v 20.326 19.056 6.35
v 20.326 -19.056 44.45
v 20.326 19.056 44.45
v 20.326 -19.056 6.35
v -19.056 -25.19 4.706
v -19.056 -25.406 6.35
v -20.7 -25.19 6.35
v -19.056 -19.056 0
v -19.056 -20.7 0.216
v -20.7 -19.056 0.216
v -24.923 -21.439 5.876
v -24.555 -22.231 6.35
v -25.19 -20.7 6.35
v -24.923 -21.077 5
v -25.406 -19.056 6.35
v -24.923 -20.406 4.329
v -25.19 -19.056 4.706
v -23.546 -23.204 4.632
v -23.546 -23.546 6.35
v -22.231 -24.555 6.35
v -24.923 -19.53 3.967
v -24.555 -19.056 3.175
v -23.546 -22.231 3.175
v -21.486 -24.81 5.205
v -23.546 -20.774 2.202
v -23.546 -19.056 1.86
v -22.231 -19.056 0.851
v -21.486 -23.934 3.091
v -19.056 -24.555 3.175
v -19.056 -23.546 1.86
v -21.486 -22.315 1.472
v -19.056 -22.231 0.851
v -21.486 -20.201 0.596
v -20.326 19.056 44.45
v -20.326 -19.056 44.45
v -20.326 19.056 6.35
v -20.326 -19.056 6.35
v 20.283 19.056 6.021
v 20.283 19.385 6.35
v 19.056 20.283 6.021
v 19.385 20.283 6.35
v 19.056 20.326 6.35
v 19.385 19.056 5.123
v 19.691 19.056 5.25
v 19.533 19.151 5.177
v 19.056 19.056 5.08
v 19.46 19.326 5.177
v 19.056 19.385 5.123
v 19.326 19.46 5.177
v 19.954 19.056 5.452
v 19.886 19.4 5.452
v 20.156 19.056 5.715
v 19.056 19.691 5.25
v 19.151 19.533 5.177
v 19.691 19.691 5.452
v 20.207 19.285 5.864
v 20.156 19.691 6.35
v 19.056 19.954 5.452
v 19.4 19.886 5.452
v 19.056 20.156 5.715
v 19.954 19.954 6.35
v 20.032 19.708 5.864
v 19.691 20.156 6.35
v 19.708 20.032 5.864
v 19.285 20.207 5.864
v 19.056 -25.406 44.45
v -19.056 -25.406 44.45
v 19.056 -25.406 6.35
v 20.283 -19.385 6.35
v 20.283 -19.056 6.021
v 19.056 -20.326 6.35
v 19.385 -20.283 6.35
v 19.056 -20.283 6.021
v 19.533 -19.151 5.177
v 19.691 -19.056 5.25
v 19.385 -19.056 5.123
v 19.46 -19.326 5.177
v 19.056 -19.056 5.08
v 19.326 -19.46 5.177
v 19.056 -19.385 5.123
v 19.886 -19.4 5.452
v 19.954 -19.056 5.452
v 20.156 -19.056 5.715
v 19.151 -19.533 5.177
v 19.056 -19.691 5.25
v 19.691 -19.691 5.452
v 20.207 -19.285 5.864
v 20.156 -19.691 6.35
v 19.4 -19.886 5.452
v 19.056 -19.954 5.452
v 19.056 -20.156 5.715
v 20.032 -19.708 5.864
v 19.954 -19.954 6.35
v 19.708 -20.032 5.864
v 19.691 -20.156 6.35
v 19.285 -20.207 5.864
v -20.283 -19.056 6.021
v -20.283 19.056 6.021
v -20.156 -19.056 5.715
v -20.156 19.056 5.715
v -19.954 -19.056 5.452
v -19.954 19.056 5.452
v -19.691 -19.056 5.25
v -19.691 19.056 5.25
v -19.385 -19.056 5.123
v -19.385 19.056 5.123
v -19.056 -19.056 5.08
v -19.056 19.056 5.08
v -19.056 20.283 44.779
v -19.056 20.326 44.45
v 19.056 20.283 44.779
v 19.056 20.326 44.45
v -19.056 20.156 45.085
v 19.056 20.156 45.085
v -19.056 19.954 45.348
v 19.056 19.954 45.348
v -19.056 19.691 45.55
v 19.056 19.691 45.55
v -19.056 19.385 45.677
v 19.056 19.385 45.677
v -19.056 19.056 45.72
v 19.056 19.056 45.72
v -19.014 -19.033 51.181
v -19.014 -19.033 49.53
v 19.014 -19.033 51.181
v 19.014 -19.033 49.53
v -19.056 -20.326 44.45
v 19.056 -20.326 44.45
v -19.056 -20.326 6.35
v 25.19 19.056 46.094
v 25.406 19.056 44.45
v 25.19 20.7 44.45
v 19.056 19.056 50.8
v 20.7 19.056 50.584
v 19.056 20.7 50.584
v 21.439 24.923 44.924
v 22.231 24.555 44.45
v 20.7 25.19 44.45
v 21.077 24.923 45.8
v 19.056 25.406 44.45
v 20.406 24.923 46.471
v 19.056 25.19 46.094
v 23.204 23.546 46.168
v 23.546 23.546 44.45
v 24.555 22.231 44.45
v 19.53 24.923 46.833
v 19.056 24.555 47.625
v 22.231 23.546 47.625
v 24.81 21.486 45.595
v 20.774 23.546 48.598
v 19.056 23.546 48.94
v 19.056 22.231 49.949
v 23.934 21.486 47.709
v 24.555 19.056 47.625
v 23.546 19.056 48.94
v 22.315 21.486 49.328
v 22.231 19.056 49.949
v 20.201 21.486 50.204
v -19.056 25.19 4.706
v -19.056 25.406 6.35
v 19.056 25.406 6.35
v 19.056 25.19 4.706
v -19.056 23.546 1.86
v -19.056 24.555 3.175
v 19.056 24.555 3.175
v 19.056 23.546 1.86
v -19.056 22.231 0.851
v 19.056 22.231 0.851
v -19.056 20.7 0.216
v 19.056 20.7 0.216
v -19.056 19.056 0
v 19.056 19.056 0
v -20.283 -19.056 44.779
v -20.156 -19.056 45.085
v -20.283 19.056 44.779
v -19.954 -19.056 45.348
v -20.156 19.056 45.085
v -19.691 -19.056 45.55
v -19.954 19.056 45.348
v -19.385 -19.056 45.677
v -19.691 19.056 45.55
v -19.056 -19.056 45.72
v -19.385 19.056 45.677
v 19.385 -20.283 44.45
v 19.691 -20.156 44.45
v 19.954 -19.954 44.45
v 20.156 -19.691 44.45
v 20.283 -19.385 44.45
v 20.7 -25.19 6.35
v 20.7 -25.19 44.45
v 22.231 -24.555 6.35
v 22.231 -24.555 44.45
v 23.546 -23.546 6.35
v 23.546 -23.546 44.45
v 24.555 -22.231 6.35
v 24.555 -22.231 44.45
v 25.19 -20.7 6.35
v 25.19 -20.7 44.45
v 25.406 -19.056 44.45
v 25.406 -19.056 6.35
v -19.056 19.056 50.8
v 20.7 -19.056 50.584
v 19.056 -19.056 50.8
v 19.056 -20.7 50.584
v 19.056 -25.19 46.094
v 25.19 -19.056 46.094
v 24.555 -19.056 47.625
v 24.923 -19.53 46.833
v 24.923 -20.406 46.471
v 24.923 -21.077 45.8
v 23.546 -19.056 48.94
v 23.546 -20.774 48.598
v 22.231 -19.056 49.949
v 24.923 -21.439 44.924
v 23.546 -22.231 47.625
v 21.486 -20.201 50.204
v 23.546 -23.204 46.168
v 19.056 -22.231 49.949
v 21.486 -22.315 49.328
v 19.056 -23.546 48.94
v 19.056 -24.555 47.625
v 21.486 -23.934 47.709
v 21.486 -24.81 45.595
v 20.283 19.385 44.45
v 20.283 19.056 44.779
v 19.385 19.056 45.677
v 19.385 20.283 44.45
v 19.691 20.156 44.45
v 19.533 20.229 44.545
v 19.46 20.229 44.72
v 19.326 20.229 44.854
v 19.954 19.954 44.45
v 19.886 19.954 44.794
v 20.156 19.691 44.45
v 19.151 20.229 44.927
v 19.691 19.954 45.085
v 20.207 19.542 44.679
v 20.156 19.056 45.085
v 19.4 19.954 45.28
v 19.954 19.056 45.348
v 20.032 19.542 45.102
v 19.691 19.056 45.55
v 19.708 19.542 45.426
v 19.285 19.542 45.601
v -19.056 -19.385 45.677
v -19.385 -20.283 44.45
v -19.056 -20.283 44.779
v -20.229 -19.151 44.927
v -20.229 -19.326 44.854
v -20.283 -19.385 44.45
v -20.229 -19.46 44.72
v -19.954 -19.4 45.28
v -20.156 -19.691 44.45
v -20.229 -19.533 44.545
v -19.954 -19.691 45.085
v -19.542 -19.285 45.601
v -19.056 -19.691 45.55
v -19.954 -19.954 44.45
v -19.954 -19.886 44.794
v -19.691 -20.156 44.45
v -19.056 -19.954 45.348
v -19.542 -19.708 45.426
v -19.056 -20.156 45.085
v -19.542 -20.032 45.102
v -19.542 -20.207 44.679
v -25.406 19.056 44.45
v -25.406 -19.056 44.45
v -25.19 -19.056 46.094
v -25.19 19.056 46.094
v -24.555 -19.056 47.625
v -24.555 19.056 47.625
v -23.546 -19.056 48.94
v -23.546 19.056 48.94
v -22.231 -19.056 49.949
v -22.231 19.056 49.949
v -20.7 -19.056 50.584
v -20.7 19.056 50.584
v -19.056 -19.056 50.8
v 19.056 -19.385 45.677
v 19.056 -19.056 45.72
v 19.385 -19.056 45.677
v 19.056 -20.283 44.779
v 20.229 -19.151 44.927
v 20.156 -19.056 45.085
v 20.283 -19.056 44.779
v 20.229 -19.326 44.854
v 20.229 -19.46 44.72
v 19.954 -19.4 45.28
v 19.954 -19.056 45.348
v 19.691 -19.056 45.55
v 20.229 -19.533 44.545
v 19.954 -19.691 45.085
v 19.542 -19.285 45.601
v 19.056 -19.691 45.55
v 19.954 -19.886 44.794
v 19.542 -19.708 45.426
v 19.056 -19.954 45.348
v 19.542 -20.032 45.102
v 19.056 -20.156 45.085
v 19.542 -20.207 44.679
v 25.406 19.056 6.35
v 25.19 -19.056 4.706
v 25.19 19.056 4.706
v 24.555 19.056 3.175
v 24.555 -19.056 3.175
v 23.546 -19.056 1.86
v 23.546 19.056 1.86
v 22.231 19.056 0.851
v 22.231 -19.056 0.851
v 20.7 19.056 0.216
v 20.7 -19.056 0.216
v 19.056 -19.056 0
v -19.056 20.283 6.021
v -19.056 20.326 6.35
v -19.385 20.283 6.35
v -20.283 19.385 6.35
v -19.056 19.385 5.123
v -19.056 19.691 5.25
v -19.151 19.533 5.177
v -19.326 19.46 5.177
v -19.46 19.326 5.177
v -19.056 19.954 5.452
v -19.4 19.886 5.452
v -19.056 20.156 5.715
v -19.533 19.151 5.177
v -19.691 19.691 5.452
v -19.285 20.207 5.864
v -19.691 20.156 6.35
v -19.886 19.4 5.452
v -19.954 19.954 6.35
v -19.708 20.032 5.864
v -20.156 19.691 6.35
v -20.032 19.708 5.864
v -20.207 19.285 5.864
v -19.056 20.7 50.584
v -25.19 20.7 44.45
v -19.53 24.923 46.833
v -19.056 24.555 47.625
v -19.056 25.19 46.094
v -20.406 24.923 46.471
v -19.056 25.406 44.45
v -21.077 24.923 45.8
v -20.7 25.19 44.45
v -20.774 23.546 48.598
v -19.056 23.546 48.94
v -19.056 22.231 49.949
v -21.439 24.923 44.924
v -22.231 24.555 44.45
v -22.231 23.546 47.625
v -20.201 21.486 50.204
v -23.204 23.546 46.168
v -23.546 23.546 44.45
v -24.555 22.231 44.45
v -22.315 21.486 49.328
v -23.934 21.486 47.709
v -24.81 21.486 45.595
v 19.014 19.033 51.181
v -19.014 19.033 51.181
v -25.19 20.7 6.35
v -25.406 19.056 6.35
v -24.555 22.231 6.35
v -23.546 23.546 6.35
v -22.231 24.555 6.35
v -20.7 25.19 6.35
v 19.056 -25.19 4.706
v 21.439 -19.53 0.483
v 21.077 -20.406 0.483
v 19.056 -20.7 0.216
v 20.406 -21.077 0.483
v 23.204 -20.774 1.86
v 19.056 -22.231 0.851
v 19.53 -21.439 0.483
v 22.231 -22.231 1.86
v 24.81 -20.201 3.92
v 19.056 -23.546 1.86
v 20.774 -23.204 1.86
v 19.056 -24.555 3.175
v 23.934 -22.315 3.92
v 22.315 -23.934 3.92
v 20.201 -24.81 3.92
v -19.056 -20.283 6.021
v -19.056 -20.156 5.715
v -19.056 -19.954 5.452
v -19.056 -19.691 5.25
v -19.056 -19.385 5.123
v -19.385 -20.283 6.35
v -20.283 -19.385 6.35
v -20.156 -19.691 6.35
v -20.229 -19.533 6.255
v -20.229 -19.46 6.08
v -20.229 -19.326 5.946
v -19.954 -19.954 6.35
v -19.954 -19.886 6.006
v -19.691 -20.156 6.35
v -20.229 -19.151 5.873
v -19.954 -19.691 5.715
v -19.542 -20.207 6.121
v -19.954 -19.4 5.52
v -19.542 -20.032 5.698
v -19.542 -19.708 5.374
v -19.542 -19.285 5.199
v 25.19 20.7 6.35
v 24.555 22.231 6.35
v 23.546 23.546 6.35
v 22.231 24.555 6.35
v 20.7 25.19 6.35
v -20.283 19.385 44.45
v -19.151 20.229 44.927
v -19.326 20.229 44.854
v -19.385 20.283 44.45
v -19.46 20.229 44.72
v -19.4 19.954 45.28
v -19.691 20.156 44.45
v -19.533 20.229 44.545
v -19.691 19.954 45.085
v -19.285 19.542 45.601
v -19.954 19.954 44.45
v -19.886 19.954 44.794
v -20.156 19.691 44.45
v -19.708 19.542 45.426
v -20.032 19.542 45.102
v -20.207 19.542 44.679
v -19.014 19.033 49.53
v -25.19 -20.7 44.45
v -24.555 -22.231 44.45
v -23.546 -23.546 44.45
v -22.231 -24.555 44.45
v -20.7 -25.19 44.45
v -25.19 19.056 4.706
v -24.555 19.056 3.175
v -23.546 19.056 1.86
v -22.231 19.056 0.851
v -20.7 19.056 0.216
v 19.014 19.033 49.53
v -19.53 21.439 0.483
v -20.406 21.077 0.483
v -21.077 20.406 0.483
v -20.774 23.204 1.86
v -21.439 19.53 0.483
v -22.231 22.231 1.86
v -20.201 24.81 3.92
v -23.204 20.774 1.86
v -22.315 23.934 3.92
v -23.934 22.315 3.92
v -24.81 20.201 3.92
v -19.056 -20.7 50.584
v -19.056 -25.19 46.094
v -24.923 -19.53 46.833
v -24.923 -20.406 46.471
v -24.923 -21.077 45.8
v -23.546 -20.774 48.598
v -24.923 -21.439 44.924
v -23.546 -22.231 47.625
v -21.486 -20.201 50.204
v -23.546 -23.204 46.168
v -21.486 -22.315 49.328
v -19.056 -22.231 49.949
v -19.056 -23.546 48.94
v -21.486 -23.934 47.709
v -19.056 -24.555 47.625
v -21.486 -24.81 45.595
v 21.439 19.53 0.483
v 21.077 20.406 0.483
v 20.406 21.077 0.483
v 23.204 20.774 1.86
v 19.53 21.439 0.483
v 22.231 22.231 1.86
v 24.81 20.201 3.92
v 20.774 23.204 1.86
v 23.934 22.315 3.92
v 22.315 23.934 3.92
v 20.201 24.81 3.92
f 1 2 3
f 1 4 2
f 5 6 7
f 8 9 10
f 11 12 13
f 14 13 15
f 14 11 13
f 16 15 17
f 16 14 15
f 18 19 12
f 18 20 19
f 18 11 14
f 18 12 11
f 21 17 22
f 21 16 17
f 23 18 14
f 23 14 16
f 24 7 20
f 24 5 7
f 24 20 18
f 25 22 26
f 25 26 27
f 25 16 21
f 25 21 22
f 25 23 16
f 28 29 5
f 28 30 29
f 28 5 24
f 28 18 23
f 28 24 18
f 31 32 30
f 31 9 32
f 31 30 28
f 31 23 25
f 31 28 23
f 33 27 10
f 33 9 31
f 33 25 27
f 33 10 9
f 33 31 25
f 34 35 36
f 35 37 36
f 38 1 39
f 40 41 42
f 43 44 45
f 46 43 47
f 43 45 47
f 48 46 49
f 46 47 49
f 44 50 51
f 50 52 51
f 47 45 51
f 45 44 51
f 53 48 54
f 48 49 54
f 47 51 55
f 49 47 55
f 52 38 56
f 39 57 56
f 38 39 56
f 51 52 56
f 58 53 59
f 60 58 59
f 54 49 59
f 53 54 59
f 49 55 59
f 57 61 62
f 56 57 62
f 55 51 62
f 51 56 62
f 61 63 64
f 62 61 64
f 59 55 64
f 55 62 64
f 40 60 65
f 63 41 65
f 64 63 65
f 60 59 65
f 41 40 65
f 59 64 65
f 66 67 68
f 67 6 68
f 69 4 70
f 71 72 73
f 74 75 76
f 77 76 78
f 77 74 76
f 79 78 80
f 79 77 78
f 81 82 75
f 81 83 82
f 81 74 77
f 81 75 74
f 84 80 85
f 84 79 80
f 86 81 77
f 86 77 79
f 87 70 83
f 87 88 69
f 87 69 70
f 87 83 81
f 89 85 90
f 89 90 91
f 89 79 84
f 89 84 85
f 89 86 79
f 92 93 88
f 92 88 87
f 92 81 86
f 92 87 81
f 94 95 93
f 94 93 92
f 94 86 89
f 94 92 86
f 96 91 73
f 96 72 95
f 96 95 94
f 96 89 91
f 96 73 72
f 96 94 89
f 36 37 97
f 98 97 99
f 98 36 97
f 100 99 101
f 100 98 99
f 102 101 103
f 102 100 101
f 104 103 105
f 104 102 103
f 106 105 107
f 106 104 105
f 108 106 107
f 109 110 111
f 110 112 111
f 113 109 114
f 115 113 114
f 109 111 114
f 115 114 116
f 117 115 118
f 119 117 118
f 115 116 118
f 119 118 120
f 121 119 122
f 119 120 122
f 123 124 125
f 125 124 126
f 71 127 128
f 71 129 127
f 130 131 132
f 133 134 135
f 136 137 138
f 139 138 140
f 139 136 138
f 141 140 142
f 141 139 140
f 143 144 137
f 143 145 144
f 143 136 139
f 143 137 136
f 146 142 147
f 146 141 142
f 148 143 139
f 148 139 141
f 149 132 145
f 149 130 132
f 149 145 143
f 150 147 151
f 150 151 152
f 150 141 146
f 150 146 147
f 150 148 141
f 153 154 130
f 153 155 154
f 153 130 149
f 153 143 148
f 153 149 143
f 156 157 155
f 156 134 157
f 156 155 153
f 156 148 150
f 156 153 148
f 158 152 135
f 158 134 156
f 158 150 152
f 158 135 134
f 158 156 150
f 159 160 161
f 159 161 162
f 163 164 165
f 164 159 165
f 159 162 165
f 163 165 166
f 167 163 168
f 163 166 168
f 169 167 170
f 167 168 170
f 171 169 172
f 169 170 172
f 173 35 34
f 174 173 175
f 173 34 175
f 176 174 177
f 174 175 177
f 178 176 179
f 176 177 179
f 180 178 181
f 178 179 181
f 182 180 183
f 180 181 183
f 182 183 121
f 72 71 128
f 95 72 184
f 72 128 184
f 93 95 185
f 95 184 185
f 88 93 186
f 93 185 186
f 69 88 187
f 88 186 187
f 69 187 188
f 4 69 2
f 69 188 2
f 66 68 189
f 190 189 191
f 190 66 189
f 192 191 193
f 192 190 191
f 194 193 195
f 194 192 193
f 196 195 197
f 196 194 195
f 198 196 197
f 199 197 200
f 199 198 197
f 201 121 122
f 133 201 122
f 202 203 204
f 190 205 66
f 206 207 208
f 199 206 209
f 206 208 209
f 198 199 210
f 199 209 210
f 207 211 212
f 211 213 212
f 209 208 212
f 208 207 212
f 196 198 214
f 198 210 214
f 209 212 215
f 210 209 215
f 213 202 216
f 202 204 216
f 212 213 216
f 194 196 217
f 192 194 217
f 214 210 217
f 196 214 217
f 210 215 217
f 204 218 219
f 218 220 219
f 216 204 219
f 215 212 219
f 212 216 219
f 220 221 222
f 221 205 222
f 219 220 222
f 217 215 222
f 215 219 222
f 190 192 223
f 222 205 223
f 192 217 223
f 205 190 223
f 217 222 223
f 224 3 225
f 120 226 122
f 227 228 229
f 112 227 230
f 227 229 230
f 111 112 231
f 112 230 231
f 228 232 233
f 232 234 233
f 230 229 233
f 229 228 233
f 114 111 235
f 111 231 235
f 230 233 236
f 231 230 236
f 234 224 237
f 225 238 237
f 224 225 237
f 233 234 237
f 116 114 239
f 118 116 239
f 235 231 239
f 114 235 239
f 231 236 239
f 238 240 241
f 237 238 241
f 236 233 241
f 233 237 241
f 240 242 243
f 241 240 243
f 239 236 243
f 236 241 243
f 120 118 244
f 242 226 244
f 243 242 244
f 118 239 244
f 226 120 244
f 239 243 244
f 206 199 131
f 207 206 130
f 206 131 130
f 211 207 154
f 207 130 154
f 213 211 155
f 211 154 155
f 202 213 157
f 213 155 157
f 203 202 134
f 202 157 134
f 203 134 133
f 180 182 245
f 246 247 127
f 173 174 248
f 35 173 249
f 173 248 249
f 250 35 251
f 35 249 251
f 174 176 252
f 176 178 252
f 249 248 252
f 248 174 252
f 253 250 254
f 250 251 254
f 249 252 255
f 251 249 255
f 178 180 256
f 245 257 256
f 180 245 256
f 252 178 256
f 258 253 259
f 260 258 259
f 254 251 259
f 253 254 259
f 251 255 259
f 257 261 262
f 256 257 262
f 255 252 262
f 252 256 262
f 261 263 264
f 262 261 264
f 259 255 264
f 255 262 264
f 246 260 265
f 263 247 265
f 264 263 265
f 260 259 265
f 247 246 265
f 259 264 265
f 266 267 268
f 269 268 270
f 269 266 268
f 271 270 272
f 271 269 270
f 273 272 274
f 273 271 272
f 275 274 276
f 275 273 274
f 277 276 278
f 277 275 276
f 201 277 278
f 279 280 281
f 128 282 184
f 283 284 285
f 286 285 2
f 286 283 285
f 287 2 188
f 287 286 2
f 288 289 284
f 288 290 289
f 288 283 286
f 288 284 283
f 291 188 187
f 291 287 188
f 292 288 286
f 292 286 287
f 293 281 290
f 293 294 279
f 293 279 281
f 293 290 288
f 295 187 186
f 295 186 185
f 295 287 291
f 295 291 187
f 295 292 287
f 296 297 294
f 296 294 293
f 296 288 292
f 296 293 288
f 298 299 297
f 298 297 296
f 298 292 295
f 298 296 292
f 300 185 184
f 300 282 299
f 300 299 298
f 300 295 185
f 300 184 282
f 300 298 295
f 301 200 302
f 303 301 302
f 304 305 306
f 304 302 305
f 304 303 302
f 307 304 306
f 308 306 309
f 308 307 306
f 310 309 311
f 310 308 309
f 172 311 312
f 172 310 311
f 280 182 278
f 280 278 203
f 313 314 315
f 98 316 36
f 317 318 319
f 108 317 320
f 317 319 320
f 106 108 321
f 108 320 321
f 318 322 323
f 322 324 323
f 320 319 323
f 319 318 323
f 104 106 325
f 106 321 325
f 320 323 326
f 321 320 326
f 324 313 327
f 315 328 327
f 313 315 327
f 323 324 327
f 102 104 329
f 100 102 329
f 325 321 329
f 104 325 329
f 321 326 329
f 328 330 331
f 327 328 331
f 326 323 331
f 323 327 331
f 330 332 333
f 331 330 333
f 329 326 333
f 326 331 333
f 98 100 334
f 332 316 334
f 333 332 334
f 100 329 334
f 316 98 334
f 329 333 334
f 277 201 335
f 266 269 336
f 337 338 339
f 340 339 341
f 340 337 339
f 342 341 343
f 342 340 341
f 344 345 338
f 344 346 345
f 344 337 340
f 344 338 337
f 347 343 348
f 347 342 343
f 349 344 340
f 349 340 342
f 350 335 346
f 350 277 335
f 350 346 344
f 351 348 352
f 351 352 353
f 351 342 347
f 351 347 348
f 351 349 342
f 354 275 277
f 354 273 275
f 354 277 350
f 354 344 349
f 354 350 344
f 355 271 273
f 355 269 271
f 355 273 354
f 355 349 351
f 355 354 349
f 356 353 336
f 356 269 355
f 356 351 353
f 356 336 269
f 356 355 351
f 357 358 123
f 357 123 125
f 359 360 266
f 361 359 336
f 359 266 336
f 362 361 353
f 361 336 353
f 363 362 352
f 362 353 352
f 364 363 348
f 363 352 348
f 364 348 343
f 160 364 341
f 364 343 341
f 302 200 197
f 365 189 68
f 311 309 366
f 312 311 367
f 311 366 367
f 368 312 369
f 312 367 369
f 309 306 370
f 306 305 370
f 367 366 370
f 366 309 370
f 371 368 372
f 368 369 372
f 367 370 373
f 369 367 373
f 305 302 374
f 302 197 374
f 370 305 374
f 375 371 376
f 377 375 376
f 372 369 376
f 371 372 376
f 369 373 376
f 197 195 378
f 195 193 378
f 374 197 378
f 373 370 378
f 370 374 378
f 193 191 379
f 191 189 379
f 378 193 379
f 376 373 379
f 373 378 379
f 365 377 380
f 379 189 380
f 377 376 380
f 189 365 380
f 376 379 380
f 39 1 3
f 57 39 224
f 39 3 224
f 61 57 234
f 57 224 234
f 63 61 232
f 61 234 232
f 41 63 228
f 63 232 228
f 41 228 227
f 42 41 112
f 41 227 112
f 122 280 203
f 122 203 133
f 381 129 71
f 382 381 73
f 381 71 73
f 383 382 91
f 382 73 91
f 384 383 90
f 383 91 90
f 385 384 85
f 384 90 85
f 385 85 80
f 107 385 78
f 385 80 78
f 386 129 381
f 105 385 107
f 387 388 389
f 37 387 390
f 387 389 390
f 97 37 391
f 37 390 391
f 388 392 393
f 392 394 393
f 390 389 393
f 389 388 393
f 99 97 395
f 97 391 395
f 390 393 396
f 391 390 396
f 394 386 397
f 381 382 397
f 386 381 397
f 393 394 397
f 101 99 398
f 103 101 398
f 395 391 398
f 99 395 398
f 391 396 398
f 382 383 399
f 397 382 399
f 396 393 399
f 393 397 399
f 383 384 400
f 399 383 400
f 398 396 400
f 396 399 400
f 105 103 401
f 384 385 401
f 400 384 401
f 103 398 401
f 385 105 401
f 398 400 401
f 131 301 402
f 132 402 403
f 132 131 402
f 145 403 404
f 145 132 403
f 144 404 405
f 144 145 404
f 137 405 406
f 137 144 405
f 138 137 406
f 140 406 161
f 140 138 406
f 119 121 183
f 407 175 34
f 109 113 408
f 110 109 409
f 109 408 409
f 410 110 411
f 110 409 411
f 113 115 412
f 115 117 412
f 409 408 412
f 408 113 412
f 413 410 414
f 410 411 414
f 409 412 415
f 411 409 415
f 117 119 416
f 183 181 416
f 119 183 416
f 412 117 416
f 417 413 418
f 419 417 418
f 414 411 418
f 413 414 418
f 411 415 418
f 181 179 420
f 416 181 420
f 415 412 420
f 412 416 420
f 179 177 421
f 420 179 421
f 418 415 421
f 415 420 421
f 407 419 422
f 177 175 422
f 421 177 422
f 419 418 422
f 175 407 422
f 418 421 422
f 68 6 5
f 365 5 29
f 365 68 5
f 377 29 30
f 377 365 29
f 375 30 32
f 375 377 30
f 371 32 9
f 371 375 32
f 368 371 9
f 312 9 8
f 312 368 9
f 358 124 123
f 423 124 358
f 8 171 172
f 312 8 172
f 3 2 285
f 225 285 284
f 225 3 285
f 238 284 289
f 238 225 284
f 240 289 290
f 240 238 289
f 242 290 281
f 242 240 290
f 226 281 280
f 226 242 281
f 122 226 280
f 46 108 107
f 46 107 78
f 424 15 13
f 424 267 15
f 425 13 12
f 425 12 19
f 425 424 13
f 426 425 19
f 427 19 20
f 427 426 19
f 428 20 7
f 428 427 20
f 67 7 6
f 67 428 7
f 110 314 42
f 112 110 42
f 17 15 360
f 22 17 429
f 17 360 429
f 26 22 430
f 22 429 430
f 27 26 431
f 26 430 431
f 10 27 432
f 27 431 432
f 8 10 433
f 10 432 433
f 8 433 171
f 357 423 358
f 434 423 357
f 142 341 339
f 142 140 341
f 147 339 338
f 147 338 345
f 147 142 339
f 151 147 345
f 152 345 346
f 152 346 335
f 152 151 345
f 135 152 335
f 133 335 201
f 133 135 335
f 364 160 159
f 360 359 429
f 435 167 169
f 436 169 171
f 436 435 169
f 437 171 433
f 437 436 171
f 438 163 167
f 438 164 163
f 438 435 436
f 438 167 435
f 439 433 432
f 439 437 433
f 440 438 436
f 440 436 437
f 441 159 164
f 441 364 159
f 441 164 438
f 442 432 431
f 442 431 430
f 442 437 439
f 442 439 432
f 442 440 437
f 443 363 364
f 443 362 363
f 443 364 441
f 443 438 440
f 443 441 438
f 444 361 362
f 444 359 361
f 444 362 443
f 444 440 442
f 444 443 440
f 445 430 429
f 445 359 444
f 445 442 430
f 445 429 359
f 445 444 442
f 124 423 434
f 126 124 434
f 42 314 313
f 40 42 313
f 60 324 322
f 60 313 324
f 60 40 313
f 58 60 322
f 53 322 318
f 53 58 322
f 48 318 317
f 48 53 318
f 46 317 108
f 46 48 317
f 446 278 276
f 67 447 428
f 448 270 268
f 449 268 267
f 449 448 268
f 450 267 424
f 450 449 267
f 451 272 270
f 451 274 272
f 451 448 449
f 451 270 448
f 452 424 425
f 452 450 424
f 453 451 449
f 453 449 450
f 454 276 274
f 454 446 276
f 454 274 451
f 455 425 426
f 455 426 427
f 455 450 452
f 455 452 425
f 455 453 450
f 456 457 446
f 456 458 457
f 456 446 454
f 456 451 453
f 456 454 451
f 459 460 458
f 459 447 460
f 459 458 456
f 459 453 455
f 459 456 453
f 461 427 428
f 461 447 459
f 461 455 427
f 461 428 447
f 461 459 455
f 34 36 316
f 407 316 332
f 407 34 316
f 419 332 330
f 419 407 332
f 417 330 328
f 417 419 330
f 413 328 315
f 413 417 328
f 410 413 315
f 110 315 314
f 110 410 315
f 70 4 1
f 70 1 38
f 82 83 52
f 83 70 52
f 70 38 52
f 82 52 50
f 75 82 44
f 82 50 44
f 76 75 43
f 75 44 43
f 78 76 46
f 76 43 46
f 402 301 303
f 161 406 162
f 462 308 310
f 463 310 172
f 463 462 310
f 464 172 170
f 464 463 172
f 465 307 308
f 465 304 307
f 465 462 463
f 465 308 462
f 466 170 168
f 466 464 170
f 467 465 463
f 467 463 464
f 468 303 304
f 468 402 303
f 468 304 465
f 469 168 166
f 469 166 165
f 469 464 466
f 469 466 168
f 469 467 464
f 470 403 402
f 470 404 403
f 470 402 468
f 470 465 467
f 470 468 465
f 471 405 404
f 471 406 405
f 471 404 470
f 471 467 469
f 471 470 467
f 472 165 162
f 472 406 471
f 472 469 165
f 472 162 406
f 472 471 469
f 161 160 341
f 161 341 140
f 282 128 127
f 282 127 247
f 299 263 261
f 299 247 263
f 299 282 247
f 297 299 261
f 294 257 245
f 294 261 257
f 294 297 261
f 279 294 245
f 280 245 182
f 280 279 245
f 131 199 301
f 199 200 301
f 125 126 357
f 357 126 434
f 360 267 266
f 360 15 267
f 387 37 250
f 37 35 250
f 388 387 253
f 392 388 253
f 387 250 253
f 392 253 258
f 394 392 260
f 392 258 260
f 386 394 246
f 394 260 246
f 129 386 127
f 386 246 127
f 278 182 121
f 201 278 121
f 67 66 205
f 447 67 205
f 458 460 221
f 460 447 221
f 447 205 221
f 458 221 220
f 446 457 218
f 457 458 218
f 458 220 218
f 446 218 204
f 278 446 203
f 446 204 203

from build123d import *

# Parameters (mm, degrees)
F0_W     = 50.8120395243
F0_H     = 50.8120395243
F1_DEPTH = 50.8
F2_R     = 6.35
F3_T     = -5.08
F5_START = 49.53
F4_W     = 38.0277968943
F4_H     = 38.0652435124
F5_DEPTH = 1.651


# Not quite as in the source:
# - a shell that OpenCascade refuses in one call is made with other operations: the cavity is built on its own and cut out


with BuildPart() as f1:
    # F0 (on Top) → F1 (new body)
    with BuildSketch(Plane.XY):
        Rectangle(F0_W, F0_H)
    extrude(amount=F1_DEPTH)

    # F2
    f2_edges = [f1.edges().sort_by_distance(p)[0] for p in [
        (0, -25.40602, 50.8),
        (25.40602, 0, 50.8),
        (25.40602, -25.40602, 25.4),
        (25.40602, 25.40602, 25.4),
        (25.40602, 0, 0),
        (0, -25.40602, 0),
        (-25.40602, 0, 50.8),
        (0, 25.40602, 50.8),
        (-25.40602, -25.40602, 25.4),
        (-25.40602, 25.40602, 25.4),
        (0, 25.40602, 0),
        (-25.40602, 0, 0),
    ]]
    fillet(f2_edges, radius=F2_R)

    # F3: a shell. OpenCascade refuses it in one call, so the cavity is built on its own and cut out:
    # the body offset inwards by the wall thickness, plus a prism from it out through each open face.
    f3_core = offset(f1.part, amount=F3_T, mode=Mode.PRIVATE)
    f3_exits = [f3_core.faces().sort_by_distance(p)[0] for p in [
        (0, 0, 45.72),
    ]]
    add(f3_core, mode=Mode.SUBTRACT)
    extrude(f3_exits, amount=-F3_T, mode=Mode.SUBTRACT)


with BuildPart() as f5:
    # F4 (on Top) → F5 (new body)
    with BuildSketch(Plane.XY.offset(F5_START)):
        Rectangle(F4_W, F4_H)
    extrude(amount=F5_DEPTH)


solid = Compound([f1.part, f5.part])
